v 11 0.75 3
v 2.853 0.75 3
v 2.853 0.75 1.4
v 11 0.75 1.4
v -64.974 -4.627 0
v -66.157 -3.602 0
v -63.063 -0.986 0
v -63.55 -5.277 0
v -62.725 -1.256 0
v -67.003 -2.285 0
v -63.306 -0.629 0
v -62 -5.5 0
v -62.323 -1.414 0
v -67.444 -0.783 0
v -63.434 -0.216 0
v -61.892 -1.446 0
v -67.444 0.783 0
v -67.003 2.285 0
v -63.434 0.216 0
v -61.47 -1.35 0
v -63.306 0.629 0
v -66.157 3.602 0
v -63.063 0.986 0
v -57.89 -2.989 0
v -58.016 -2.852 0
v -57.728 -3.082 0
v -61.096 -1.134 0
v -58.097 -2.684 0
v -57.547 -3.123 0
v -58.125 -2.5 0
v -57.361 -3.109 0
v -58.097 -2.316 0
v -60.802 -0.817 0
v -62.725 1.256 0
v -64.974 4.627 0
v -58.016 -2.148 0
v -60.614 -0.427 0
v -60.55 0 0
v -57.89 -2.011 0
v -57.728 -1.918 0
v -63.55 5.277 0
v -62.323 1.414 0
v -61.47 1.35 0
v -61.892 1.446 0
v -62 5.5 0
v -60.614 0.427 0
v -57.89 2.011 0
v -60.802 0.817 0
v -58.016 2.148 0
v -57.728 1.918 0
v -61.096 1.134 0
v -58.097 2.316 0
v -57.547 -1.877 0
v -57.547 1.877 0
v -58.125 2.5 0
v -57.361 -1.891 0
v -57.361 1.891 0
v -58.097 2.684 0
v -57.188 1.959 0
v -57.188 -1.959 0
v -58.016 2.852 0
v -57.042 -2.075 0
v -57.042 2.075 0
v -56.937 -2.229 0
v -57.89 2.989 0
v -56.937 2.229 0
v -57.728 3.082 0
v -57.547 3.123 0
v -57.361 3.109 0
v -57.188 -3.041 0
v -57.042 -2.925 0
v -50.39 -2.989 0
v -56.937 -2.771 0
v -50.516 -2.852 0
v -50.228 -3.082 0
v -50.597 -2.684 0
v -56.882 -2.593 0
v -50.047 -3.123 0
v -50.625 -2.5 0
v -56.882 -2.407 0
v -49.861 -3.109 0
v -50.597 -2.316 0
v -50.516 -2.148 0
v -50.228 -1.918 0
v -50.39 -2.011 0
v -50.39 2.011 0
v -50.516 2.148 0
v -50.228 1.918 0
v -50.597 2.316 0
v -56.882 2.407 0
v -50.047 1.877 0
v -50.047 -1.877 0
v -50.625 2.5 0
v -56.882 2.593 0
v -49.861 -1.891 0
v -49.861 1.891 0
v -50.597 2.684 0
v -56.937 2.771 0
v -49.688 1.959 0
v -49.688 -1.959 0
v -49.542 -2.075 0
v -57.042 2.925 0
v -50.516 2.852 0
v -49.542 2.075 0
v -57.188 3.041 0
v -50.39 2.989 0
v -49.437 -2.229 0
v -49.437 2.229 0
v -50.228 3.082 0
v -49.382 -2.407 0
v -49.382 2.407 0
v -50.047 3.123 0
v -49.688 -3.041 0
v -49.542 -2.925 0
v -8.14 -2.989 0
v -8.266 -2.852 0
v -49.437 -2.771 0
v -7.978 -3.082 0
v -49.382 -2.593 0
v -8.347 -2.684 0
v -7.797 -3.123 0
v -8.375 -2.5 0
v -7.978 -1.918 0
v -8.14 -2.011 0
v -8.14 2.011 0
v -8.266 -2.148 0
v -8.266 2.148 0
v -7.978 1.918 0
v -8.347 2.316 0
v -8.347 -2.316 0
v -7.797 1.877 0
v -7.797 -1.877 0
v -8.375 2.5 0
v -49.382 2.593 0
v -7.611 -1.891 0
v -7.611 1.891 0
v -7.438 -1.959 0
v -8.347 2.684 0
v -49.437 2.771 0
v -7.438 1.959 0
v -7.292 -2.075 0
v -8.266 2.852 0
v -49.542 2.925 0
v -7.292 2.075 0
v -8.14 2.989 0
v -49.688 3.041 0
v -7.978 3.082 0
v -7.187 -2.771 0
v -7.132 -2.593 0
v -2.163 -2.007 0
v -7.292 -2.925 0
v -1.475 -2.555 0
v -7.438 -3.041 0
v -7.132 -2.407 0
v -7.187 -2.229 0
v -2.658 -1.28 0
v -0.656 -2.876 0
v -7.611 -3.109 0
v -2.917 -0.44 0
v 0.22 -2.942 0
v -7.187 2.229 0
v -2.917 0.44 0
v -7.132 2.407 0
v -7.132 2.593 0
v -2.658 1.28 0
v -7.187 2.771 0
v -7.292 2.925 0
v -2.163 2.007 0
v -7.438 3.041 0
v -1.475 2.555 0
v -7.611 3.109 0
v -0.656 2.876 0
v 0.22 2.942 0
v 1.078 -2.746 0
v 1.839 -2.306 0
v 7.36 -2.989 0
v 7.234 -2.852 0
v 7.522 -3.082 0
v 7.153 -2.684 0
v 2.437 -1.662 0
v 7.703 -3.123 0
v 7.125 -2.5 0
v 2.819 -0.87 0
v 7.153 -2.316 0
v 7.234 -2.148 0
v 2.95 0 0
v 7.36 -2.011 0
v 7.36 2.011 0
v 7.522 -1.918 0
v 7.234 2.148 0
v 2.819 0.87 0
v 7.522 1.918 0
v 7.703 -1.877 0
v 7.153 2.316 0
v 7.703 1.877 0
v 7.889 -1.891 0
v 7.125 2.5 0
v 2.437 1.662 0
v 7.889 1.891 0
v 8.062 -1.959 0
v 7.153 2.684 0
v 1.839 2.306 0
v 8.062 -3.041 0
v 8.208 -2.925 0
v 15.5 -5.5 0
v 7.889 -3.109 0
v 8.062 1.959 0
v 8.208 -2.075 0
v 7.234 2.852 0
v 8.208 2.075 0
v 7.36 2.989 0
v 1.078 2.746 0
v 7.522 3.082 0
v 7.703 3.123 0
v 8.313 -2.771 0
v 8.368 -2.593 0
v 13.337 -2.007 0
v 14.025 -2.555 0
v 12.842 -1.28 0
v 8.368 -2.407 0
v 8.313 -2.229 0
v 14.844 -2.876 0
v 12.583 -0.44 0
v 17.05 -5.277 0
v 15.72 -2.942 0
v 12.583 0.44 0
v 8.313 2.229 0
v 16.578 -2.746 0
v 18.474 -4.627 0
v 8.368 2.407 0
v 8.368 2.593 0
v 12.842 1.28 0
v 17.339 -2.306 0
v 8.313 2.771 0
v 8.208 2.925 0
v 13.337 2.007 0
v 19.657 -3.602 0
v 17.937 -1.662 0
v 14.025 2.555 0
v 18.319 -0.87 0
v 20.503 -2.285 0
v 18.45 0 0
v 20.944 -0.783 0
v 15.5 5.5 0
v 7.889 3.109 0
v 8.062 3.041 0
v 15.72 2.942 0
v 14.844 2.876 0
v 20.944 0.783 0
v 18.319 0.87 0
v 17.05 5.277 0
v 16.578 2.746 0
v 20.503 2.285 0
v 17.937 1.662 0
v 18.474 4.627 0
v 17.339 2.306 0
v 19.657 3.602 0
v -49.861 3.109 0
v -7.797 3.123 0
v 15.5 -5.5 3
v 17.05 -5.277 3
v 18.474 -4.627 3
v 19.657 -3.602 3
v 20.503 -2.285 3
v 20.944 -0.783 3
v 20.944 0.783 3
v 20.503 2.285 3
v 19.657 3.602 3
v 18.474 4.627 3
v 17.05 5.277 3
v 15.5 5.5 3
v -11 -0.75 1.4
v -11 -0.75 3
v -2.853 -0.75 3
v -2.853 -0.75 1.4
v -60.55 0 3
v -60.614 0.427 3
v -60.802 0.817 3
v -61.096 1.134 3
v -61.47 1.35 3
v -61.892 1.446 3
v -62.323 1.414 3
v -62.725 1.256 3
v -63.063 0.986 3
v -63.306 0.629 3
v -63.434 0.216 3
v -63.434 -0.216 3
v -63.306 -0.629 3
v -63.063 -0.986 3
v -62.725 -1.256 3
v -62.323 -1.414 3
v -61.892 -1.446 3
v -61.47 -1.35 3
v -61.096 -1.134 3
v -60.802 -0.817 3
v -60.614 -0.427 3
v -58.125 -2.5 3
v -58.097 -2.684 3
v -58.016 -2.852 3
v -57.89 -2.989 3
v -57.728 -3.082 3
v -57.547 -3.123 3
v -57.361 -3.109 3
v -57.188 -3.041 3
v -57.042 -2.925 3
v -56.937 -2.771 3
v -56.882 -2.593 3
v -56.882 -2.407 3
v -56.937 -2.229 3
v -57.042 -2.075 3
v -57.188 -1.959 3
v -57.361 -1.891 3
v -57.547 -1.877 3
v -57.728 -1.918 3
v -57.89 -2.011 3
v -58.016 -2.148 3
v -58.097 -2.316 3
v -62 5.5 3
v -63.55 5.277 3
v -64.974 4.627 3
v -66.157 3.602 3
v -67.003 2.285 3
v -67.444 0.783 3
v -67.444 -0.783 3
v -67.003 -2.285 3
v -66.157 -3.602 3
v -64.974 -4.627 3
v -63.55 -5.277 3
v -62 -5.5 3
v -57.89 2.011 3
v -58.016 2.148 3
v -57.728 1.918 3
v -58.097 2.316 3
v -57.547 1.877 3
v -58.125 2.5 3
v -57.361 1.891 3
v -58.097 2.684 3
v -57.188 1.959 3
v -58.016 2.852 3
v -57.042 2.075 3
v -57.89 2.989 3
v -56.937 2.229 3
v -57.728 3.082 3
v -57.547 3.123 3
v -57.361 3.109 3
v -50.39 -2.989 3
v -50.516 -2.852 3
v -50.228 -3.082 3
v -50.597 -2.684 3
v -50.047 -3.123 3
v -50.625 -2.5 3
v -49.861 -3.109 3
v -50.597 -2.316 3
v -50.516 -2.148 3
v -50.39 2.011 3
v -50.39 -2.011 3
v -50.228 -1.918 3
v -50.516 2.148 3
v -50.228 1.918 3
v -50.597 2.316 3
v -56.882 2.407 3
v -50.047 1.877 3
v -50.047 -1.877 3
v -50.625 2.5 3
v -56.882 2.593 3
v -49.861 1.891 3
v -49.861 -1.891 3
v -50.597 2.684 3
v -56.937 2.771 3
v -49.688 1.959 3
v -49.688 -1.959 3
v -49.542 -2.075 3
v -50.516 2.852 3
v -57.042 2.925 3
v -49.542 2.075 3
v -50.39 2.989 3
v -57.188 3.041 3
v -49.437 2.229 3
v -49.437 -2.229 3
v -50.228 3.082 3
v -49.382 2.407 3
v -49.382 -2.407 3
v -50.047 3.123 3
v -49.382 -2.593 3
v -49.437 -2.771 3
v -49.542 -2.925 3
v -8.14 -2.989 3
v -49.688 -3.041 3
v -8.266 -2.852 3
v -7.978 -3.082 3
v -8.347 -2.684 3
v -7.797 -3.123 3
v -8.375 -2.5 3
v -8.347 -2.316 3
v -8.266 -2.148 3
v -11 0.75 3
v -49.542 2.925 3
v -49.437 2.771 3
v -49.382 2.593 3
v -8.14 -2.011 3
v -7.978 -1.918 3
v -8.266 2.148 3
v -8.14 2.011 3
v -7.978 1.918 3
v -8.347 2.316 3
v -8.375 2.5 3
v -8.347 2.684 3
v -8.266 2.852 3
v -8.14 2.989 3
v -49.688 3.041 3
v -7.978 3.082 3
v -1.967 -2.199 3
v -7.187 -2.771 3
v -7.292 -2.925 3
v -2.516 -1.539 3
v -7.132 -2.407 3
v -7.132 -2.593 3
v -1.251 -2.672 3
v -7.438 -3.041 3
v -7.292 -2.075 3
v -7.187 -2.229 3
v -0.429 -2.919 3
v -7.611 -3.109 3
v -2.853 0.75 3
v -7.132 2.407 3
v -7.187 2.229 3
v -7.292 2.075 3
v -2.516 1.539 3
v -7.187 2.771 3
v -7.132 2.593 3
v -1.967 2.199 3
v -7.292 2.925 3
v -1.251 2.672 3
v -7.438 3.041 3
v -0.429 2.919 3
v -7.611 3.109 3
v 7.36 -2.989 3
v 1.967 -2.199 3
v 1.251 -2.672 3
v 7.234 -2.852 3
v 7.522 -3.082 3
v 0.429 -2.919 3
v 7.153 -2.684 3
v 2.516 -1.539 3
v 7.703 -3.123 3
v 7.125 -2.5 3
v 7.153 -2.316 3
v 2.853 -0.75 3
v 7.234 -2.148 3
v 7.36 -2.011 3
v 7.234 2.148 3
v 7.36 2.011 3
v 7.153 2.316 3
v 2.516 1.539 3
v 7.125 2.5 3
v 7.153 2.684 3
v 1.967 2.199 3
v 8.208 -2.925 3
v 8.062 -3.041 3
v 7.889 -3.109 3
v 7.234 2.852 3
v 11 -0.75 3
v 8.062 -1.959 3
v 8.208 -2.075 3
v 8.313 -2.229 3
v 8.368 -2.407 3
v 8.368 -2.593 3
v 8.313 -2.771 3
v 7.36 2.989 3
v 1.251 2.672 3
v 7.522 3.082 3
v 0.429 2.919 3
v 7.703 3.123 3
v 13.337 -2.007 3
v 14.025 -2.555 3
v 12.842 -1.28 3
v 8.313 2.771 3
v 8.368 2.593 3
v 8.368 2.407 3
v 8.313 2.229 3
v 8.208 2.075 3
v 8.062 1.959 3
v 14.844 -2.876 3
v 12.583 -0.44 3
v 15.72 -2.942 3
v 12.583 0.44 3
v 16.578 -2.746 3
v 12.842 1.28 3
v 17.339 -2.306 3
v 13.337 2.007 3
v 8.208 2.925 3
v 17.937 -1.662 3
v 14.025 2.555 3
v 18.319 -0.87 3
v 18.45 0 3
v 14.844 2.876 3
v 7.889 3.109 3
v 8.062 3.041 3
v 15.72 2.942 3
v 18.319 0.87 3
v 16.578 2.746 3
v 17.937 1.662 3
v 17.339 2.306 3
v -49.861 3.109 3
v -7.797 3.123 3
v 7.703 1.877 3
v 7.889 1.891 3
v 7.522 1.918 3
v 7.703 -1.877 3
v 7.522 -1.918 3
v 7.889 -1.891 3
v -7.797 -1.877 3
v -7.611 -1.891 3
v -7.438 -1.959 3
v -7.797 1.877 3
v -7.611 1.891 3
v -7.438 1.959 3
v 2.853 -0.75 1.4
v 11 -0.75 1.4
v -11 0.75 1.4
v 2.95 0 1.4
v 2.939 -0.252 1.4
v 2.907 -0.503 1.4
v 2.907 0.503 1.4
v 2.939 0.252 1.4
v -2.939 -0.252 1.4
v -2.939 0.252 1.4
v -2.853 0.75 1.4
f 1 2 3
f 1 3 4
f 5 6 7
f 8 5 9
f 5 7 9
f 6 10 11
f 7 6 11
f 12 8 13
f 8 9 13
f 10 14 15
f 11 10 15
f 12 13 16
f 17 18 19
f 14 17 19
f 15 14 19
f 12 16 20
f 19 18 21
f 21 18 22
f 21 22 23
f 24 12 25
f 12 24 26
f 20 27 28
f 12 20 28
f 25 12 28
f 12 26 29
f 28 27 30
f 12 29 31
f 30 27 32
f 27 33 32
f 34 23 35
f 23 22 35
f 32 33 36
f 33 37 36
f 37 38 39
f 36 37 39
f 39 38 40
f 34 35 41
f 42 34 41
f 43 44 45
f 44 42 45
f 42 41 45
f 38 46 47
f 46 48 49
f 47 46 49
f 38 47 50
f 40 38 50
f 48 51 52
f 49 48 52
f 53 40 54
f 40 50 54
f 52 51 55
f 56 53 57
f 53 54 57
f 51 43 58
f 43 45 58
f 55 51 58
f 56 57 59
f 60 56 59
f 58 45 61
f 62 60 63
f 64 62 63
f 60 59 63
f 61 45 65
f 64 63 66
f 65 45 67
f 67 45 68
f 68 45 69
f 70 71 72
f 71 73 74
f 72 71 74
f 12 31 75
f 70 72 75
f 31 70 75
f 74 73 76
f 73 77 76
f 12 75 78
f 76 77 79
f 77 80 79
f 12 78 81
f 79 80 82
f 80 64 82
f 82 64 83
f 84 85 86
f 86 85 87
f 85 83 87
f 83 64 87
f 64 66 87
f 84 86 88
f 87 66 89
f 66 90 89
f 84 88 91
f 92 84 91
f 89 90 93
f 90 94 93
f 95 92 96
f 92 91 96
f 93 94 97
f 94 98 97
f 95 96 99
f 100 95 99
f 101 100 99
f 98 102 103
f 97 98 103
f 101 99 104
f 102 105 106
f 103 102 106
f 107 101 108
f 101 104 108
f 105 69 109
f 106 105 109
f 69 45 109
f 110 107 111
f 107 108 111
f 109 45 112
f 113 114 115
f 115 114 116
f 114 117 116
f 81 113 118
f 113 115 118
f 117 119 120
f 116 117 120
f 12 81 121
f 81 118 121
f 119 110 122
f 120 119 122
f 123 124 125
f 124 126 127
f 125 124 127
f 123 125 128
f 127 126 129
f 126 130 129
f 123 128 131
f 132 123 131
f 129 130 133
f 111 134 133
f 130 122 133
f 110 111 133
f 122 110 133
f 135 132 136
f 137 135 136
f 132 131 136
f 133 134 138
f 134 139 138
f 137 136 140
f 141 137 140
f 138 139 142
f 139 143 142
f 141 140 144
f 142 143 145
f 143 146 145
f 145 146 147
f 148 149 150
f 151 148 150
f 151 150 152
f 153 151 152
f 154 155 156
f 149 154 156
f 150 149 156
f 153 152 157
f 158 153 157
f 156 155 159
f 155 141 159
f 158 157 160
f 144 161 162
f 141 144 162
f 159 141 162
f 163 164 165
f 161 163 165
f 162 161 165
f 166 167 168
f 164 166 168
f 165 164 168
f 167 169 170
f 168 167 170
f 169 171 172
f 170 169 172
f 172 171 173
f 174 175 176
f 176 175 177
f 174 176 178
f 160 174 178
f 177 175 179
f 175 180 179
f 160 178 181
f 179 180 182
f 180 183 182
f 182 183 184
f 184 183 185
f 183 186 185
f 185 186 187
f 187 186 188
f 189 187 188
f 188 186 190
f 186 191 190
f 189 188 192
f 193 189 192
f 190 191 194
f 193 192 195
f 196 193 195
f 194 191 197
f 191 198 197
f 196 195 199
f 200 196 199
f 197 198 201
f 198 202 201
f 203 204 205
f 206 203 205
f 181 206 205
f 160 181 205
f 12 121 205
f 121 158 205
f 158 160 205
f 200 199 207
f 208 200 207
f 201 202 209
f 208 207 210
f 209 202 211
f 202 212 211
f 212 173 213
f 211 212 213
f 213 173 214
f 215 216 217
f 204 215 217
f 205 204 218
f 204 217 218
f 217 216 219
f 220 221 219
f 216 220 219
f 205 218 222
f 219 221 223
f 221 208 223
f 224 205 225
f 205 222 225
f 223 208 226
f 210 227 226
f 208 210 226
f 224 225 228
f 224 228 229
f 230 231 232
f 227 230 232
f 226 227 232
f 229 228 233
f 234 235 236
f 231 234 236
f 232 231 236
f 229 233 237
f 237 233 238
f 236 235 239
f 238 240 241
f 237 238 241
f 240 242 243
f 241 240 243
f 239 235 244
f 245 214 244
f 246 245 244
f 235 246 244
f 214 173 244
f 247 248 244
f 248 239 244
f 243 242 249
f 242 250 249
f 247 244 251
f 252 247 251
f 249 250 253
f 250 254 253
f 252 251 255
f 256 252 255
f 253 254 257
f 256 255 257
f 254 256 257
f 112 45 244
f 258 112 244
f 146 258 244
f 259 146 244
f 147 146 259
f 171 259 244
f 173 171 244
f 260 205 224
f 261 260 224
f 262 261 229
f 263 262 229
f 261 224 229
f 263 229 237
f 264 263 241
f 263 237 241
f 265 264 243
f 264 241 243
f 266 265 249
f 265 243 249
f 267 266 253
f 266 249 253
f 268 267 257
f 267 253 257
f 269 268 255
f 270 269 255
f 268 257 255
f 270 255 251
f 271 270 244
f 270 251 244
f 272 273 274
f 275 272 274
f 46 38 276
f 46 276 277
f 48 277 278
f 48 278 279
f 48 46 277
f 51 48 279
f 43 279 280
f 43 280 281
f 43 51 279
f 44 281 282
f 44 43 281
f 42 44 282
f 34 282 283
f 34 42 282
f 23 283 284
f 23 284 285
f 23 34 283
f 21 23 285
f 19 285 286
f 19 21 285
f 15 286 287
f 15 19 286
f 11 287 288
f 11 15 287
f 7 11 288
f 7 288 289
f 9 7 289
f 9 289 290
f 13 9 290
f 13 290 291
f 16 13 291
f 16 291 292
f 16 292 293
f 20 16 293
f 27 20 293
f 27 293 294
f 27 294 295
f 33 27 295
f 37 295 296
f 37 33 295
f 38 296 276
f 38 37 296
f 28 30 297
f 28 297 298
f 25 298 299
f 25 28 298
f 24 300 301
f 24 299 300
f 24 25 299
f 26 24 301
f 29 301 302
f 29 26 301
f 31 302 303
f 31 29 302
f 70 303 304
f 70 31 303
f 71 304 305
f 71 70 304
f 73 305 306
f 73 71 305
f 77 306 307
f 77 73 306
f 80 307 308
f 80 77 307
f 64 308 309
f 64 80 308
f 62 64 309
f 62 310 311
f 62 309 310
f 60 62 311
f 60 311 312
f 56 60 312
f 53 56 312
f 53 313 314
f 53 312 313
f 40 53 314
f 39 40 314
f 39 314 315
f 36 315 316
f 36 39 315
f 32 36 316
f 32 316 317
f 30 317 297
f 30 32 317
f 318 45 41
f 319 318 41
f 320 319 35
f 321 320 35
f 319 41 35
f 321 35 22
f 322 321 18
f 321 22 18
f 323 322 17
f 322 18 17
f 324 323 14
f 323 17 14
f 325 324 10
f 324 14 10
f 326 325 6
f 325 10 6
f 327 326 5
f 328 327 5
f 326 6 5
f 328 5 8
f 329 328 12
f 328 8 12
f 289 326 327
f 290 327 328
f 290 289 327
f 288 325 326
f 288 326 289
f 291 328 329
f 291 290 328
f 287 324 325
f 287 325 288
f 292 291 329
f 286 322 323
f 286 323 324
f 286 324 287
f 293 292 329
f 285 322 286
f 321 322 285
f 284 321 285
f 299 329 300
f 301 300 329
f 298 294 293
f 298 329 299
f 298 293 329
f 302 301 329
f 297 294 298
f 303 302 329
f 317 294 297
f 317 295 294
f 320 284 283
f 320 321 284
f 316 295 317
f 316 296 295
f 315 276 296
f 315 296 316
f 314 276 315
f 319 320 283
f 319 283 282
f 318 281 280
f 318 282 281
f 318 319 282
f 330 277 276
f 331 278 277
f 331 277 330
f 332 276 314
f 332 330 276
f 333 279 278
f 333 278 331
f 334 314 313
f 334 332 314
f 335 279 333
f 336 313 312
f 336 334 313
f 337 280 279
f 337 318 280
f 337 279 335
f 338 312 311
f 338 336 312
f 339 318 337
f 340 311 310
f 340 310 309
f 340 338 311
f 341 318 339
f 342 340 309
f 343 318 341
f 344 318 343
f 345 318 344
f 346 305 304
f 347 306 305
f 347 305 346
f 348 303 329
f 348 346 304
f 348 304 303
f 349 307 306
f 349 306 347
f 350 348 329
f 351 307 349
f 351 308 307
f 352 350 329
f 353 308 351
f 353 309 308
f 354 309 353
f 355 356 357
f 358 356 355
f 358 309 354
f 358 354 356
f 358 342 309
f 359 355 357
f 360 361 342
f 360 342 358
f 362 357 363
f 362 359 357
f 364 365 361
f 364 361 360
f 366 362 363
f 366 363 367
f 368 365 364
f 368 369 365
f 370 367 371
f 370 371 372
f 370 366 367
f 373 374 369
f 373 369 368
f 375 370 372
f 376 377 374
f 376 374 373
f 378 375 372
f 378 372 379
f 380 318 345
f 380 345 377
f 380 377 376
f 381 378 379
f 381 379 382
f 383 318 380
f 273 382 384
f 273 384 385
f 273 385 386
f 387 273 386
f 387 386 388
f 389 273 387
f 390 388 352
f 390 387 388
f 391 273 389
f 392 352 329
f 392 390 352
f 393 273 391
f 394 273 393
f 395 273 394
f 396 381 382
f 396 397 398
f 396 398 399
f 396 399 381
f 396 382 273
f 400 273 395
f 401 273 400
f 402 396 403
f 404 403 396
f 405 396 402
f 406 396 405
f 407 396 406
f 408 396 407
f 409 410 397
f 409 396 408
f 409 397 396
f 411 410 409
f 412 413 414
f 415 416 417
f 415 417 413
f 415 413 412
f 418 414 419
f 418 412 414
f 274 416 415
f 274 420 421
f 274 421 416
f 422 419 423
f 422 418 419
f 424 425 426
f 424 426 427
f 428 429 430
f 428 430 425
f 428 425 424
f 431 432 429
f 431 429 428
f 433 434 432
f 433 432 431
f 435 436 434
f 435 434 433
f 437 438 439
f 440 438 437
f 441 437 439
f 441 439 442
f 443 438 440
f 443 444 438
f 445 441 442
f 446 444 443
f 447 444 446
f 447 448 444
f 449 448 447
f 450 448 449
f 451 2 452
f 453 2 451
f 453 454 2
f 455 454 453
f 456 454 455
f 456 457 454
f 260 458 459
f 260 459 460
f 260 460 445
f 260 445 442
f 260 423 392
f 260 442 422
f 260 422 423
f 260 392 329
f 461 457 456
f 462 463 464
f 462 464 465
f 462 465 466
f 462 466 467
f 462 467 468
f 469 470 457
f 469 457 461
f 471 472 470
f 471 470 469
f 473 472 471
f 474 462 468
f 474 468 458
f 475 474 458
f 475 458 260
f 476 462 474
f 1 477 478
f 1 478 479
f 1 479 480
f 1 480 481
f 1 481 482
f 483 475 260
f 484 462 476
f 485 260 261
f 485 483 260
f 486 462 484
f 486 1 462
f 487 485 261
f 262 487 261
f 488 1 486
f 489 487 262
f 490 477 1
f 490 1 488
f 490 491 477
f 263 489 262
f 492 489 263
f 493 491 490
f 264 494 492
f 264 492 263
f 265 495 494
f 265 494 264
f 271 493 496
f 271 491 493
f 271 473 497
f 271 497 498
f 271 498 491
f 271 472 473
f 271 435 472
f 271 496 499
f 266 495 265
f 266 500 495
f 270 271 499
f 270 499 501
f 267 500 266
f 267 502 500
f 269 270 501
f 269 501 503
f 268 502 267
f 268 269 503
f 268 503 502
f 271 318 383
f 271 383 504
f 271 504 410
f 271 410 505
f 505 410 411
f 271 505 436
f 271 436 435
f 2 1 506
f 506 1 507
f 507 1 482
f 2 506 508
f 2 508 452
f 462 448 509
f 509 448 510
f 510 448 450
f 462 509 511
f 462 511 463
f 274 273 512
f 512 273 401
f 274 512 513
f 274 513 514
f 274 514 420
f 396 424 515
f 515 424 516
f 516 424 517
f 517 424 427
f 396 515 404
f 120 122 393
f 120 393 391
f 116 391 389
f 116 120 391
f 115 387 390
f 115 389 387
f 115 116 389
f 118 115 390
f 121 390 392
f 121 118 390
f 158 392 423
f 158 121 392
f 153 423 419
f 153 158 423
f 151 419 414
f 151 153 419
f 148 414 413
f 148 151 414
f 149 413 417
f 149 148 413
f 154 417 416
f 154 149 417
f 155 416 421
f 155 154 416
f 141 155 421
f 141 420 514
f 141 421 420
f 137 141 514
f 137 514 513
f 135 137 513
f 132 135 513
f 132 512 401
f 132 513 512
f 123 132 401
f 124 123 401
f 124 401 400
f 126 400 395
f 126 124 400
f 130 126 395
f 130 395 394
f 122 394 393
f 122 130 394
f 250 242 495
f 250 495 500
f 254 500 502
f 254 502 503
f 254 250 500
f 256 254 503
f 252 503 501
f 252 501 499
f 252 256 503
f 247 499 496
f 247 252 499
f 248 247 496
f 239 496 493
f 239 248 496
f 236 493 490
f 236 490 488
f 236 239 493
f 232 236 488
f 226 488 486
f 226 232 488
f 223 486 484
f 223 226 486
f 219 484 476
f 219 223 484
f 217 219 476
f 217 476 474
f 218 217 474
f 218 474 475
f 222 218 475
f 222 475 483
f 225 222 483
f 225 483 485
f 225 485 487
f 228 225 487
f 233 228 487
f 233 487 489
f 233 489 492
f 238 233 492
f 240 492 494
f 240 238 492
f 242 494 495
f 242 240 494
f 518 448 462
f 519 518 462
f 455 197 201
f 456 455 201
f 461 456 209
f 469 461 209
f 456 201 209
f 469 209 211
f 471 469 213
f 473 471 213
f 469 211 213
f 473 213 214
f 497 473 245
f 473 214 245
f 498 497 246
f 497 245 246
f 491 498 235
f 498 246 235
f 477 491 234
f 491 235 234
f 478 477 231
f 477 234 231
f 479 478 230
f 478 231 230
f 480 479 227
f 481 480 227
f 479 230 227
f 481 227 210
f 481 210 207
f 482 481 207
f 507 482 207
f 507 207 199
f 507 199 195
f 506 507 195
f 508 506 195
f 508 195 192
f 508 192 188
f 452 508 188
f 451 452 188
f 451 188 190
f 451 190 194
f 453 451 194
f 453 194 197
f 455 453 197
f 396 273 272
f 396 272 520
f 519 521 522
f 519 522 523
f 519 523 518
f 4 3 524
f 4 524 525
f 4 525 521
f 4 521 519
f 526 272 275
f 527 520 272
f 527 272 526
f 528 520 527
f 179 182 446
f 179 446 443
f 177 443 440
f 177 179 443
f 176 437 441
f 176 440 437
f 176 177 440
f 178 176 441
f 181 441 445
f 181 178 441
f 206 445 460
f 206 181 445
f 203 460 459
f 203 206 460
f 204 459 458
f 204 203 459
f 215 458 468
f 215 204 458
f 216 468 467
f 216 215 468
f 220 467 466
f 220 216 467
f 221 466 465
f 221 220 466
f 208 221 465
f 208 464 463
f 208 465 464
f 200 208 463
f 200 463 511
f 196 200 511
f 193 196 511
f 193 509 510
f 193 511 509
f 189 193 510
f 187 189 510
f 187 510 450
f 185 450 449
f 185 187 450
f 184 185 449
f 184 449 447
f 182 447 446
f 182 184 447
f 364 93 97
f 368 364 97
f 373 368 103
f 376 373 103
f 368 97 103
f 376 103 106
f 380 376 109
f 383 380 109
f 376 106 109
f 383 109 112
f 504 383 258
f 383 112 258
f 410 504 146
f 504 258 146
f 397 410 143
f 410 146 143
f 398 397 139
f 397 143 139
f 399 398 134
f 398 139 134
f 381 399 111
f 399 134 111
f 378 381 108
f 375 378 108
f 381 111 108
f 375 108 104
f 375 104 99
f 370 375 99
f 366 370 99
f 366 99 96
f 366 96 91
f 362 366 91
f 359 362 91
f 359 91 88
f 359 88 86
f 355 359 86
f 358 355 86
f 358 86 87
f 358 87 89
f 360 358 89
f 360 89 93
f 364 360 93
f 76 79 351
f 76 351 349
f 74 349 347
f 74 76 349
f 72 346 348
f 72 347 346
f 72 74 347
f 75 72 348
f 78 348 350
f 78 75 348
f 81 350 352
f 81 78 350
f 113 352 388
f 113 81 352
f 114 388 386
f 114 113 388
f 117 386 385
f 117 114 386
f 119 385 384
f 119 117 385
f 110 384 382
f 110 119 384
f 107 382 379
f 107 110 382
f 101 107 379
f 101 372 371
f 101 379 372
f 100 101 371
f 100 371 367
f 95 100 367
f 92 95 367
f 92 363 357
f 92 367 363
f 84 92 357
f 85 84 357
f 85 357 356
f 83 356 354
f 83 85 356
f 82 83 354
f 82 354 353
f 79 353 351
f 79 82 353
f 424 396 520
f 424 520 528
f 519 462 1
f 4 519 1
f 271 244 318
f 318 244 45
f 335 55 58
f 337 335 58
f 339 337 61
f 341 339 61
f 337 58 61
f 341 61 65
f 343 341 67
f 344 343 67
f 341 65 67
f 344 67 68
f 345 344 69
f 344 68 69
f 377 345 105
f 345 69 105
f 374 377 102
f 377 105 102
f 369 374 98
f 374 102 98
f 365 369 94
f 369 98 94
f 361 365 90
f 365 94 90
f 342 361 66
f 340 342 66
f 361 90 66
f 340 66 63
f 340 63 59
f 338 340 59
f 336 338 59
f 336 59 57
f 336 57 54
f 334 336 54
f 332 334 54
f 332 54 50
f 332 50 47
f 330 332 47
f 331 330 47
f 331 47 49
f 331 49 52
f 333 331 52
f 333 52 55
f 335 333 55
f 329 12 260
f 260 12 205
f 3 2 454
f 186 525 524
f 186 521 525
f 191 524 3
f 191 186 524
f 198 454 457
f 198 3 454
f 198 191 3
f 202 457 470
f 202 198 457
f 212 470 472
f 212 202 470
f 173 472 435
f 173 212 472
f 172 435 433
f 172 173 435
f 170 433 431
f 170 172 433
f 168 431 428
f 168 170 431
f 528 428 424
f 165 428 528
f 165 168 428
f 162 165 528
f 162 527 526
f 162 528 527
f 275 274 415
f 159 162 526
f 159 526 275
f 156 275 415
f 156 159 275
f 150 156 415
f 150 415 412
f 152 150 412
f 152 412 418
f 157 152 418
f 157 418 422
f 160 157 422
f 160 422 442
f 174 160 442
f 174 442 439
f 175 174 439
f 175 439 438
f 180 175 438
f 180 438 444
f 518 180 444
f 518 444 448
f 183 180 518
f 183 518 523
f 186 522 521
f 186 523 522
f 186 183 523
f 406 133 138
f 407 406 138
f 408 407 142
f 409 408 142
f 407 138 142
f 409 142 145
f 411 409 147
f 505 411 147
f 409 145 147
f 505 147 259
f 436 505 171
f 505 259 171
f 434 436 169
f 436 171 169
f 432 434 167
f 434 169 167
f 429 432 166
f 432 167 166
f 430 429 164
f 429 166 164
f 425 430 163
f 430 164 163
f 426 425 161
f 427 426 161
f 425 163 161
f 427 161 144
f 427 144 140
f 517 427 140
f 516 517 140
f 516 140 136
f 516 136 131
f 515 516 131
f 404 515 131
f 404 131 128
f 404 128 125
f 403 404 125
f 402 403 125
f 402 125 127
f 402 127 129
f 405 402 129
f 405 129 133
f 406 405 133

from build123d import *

# Parameters (mm, degrees)
SKETCH1_R               = 1.45
SKETCH1_R_2             = 2.95
BOSS_EXTRUDE1_DEPTH     = 3
TROU_TARAUD_M1_61_D     = 1.25
ESQUISSE3_W             = 22
ESQUISSE3_H             = 1.5
ENL_V_MAT_EXTRU_1_DEPTH = 1.6


with BuildPart() as part:
    # Sketch1 → Boss-Extrude1 (new body)
    with BuildSketch(Plane.XY):
        with BuildLine():
            Line((15.5, 5.5), (-62, 5.5))
            ThreePointArc((-62, 5.5), (-67.5, 0), (-62, -5.5))
            Line((-62, -5.5), (15.5, -5.5))
            ThreePointArc((15.5, -5.5), (21, 0), (15.5, 5.5))
        make_face()
        with Locations((-62, 0)):
            Circle(SKETCH1_R, mode=Mode.SUBTRACT)
        Circle(SKETCH1_R_2, mode=Mode.SUBTRACT)
        with Locations((15.5, 0)):
            Circle(SKETCH1_R_2, mode=Mode.SUBTRACT)
    extrude(amount=BOSS_EXTRUDE1_DEPTH)

    # Trou taraudé M1.61 (through all)
    with Locations(Plane.XY.offset(3)):
        with Locations((7.75, 2.5), (-7.75, 2.5), (-57.5, 2.5), (-50, 2.5)):
            trou_taraud_m1_61 = Hole(TROU_TARAUD_M1_61_D / 2)

    # Mirror1: Trou taraudé M1.61 across plane
    add(trou_taraud_m1_61.mirror(Plane.ZX), mode=Mode.SUBTRACT)

    # Esquisse3 → Enlèv. mat.-Extru.1 (cut)
    with BuildSketch(Plane.XY.offset(3)):
        Rectangle(ESQUISSE3_W, ESQUISSE3_H)
    extrude(amount=-ENL_V_MAT_EXTRU_1_DEPTH, mode=Mode.SUBTRACT)


solid = part.part
